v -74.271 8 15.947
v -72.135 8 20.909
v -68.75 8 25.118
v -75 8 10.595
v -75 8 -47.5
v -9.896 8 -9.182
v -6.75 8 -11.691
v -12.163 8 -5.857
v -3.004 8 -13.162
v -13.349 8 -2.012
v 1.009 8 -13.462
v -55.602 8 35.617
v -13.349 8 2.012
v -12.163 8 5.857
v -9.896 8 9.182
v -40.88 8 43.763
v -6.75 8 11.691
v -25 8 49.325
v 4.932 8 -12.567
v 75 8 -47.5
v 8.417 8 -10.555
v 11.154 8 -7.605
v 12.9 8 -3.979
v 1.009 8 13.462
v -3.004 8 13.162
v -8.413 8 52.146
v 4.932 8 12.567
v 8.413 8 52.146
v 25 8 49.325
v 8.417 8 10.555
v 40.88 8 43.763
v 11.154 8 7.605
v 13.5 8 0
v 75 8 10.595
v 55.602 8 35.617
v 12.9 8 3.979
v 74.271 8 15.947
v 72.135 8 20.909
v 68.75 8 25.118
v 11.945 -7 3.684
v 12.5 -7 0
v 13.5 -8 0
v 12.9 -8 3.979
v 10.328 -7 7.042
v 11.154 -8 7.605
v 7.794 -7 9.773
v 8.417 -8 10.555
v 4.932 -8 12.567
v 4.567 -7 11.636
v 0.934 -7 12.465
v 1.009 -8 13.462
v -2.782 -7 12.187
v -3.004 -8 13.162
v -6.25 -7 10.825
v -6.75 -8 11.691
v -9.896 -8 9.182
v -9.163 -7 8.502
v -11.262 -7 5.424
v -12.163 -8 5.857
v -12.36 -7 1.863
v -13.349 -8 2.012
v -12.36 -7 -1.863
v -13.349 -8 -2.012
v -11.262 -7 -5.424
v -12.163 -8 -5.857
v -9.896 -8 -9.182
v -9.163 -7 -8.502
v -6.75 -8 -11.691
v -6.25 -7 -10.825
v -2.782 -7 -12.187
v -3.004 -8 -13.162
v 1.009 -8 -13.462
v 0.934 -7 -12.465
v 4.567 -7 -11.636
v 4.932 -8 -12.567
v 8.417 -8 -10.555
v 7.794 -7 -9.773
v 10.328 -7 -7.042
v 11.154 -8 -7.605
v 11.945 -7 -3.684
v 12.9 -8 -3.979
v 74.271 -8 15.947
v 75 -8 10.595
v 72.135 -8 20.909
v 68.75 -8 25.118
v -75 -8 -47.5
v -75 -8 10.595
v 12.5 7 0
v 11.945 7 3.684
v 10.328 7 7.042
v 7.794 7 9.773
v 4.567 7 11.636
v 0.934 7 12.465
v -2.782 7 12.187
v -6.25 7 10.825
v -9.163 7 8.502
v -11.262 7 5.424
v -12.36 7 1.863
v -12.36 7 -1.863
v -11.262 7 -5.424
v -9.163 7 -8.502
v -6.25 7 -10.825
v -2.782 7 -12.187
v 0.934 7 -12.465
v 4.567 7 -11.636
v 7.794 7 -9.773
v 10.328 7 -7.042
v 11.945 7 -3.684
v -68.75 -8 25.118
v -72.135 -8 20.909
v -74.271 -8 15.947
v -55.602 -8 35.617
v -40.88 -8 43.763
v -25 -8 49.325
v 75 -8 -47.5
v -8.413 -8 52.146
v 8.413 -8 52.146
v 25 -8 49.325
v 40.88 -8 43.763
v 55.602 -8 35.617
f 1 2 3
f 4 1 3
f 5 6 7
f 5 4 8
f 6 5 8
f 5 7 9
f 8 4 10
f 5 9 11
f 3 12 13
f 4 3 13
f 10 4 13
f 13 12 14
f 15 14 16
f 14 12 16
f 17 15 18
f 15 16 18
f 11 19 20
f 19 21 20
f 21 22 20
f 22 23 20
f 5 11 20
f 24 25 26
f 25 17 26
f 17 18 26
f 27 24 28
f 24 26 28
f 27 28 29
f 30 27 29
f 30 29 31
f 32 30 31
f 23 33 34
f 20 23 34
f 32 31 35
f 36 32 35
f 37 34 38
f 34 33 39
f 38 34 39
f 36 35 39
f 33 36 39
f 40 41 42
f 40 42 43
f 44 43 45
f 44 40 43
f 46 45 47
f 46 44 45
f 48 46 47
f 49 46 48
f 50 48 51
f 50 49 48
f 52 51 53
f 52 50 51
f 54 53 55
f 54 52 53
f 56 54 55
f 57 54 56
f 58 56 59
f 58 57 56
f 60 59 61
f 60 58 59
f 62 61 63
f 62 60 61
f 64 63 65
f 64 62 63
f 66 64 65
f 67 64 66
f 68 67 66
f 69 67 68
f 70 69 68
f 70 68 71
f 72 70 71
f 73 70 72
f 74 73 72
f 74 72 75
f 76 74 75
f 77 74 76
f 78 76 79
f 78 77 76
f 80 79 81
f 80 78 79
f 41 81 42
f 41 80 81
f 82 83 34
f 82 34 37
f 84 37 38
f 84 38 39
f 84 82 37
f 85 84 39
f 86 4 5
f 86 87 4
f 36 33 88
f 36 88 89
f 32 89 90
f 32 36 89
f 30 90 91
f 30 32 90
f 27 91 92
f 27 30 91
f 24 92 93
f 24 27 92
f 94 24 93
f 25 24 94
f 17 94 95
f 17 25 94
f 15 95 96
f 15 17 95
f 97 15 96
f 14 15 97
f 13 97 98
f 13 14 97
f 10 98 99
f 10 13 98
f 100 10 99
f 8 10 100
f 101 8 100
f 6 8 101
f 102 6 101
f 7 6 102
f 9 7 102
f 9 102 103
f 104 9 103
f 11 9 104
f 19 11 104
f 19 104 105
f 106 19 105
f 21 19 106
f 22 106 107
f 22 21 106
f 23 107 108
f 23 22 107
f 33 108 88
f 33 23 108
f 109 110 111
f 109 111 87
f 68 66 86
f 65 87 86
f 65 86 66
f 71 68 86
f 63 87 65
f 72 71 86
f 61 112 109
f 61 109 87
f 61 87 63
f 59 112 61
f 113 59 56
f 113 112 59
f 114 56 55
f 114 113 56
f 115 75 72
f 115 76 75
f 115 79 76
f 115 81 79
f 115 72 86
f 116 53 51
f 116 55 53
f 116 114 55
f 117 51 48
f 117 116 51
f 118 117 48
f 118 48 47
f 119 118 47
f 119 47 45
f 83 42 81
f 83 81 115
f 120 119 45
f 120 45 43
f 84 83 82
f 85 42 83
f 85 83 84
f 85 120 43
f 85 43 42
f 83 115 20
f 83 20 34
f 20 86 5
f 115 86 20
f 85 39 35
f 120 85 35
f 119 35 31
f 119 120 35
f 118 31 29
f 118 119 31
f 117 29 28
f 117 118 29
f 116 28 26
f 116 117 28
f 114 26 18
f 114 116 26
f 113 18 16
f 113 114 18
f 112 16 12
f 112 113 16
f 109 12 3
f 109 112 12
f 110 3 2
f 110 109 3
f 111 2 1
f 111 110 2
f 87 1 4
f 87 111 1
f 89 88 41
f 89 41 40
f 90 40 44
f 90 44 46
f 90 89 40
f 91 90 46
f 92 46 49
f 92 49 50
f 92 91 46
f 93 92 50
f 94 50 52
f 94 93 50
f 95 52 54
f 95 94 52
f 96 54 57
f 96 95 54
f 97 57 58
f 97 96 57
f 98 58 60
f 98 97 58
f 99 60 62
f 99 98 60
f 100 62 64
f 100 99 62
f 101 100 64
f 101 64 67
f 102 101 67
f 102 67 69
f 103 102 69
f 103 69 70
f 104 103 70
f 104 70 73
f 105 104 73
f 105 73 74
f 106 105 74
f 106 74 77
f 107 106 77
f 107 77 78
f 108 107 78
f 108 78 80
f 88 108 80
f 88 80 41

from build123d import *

# Parameters (mm, degrees)
F0_R     = 12.5
F1_DEPTH = 8
F2_SIZE  = 1


with BuildPart() as f1:
    # F0 (on Front) → F1 (new body, symmetric)
    with BuildSketch(Plane.XZ):
        with BuildLine():
            Line((-75, 10.5947501931), (-75, -47.5))
            Line((-75, -47.5), (75, -47.5))
            Line((75, -47.5), (75, 10.5947501931))
            ThreePointArc((75, 10.5947501931), (73.3711730709, 18.5004443435), (68.75, 25.1184377414))
            ThreePointArc((68.75, 25.1184377414), (0, 52.5), (-68.75, 25.1184377414))
            ThreePointArc((-68.75, 25.1184377414), (-73.3711730709, 18.5004443435), (-75, 10.5947501931))
        make_face()
        Circle(F0_R, mode=Mode.SUBTRACT)
    extrude(amount=F1_DEPTH, both=True)

    # F2
    f2_edges = [f1.edges().sort_by_distance(p)[0] for p in [
        (-12.5, -8, 0),
        (-12.5, 8, 0),
    ]]
    chamfer(f2_edges, length=F2_SIZE)


solid = f1.part
